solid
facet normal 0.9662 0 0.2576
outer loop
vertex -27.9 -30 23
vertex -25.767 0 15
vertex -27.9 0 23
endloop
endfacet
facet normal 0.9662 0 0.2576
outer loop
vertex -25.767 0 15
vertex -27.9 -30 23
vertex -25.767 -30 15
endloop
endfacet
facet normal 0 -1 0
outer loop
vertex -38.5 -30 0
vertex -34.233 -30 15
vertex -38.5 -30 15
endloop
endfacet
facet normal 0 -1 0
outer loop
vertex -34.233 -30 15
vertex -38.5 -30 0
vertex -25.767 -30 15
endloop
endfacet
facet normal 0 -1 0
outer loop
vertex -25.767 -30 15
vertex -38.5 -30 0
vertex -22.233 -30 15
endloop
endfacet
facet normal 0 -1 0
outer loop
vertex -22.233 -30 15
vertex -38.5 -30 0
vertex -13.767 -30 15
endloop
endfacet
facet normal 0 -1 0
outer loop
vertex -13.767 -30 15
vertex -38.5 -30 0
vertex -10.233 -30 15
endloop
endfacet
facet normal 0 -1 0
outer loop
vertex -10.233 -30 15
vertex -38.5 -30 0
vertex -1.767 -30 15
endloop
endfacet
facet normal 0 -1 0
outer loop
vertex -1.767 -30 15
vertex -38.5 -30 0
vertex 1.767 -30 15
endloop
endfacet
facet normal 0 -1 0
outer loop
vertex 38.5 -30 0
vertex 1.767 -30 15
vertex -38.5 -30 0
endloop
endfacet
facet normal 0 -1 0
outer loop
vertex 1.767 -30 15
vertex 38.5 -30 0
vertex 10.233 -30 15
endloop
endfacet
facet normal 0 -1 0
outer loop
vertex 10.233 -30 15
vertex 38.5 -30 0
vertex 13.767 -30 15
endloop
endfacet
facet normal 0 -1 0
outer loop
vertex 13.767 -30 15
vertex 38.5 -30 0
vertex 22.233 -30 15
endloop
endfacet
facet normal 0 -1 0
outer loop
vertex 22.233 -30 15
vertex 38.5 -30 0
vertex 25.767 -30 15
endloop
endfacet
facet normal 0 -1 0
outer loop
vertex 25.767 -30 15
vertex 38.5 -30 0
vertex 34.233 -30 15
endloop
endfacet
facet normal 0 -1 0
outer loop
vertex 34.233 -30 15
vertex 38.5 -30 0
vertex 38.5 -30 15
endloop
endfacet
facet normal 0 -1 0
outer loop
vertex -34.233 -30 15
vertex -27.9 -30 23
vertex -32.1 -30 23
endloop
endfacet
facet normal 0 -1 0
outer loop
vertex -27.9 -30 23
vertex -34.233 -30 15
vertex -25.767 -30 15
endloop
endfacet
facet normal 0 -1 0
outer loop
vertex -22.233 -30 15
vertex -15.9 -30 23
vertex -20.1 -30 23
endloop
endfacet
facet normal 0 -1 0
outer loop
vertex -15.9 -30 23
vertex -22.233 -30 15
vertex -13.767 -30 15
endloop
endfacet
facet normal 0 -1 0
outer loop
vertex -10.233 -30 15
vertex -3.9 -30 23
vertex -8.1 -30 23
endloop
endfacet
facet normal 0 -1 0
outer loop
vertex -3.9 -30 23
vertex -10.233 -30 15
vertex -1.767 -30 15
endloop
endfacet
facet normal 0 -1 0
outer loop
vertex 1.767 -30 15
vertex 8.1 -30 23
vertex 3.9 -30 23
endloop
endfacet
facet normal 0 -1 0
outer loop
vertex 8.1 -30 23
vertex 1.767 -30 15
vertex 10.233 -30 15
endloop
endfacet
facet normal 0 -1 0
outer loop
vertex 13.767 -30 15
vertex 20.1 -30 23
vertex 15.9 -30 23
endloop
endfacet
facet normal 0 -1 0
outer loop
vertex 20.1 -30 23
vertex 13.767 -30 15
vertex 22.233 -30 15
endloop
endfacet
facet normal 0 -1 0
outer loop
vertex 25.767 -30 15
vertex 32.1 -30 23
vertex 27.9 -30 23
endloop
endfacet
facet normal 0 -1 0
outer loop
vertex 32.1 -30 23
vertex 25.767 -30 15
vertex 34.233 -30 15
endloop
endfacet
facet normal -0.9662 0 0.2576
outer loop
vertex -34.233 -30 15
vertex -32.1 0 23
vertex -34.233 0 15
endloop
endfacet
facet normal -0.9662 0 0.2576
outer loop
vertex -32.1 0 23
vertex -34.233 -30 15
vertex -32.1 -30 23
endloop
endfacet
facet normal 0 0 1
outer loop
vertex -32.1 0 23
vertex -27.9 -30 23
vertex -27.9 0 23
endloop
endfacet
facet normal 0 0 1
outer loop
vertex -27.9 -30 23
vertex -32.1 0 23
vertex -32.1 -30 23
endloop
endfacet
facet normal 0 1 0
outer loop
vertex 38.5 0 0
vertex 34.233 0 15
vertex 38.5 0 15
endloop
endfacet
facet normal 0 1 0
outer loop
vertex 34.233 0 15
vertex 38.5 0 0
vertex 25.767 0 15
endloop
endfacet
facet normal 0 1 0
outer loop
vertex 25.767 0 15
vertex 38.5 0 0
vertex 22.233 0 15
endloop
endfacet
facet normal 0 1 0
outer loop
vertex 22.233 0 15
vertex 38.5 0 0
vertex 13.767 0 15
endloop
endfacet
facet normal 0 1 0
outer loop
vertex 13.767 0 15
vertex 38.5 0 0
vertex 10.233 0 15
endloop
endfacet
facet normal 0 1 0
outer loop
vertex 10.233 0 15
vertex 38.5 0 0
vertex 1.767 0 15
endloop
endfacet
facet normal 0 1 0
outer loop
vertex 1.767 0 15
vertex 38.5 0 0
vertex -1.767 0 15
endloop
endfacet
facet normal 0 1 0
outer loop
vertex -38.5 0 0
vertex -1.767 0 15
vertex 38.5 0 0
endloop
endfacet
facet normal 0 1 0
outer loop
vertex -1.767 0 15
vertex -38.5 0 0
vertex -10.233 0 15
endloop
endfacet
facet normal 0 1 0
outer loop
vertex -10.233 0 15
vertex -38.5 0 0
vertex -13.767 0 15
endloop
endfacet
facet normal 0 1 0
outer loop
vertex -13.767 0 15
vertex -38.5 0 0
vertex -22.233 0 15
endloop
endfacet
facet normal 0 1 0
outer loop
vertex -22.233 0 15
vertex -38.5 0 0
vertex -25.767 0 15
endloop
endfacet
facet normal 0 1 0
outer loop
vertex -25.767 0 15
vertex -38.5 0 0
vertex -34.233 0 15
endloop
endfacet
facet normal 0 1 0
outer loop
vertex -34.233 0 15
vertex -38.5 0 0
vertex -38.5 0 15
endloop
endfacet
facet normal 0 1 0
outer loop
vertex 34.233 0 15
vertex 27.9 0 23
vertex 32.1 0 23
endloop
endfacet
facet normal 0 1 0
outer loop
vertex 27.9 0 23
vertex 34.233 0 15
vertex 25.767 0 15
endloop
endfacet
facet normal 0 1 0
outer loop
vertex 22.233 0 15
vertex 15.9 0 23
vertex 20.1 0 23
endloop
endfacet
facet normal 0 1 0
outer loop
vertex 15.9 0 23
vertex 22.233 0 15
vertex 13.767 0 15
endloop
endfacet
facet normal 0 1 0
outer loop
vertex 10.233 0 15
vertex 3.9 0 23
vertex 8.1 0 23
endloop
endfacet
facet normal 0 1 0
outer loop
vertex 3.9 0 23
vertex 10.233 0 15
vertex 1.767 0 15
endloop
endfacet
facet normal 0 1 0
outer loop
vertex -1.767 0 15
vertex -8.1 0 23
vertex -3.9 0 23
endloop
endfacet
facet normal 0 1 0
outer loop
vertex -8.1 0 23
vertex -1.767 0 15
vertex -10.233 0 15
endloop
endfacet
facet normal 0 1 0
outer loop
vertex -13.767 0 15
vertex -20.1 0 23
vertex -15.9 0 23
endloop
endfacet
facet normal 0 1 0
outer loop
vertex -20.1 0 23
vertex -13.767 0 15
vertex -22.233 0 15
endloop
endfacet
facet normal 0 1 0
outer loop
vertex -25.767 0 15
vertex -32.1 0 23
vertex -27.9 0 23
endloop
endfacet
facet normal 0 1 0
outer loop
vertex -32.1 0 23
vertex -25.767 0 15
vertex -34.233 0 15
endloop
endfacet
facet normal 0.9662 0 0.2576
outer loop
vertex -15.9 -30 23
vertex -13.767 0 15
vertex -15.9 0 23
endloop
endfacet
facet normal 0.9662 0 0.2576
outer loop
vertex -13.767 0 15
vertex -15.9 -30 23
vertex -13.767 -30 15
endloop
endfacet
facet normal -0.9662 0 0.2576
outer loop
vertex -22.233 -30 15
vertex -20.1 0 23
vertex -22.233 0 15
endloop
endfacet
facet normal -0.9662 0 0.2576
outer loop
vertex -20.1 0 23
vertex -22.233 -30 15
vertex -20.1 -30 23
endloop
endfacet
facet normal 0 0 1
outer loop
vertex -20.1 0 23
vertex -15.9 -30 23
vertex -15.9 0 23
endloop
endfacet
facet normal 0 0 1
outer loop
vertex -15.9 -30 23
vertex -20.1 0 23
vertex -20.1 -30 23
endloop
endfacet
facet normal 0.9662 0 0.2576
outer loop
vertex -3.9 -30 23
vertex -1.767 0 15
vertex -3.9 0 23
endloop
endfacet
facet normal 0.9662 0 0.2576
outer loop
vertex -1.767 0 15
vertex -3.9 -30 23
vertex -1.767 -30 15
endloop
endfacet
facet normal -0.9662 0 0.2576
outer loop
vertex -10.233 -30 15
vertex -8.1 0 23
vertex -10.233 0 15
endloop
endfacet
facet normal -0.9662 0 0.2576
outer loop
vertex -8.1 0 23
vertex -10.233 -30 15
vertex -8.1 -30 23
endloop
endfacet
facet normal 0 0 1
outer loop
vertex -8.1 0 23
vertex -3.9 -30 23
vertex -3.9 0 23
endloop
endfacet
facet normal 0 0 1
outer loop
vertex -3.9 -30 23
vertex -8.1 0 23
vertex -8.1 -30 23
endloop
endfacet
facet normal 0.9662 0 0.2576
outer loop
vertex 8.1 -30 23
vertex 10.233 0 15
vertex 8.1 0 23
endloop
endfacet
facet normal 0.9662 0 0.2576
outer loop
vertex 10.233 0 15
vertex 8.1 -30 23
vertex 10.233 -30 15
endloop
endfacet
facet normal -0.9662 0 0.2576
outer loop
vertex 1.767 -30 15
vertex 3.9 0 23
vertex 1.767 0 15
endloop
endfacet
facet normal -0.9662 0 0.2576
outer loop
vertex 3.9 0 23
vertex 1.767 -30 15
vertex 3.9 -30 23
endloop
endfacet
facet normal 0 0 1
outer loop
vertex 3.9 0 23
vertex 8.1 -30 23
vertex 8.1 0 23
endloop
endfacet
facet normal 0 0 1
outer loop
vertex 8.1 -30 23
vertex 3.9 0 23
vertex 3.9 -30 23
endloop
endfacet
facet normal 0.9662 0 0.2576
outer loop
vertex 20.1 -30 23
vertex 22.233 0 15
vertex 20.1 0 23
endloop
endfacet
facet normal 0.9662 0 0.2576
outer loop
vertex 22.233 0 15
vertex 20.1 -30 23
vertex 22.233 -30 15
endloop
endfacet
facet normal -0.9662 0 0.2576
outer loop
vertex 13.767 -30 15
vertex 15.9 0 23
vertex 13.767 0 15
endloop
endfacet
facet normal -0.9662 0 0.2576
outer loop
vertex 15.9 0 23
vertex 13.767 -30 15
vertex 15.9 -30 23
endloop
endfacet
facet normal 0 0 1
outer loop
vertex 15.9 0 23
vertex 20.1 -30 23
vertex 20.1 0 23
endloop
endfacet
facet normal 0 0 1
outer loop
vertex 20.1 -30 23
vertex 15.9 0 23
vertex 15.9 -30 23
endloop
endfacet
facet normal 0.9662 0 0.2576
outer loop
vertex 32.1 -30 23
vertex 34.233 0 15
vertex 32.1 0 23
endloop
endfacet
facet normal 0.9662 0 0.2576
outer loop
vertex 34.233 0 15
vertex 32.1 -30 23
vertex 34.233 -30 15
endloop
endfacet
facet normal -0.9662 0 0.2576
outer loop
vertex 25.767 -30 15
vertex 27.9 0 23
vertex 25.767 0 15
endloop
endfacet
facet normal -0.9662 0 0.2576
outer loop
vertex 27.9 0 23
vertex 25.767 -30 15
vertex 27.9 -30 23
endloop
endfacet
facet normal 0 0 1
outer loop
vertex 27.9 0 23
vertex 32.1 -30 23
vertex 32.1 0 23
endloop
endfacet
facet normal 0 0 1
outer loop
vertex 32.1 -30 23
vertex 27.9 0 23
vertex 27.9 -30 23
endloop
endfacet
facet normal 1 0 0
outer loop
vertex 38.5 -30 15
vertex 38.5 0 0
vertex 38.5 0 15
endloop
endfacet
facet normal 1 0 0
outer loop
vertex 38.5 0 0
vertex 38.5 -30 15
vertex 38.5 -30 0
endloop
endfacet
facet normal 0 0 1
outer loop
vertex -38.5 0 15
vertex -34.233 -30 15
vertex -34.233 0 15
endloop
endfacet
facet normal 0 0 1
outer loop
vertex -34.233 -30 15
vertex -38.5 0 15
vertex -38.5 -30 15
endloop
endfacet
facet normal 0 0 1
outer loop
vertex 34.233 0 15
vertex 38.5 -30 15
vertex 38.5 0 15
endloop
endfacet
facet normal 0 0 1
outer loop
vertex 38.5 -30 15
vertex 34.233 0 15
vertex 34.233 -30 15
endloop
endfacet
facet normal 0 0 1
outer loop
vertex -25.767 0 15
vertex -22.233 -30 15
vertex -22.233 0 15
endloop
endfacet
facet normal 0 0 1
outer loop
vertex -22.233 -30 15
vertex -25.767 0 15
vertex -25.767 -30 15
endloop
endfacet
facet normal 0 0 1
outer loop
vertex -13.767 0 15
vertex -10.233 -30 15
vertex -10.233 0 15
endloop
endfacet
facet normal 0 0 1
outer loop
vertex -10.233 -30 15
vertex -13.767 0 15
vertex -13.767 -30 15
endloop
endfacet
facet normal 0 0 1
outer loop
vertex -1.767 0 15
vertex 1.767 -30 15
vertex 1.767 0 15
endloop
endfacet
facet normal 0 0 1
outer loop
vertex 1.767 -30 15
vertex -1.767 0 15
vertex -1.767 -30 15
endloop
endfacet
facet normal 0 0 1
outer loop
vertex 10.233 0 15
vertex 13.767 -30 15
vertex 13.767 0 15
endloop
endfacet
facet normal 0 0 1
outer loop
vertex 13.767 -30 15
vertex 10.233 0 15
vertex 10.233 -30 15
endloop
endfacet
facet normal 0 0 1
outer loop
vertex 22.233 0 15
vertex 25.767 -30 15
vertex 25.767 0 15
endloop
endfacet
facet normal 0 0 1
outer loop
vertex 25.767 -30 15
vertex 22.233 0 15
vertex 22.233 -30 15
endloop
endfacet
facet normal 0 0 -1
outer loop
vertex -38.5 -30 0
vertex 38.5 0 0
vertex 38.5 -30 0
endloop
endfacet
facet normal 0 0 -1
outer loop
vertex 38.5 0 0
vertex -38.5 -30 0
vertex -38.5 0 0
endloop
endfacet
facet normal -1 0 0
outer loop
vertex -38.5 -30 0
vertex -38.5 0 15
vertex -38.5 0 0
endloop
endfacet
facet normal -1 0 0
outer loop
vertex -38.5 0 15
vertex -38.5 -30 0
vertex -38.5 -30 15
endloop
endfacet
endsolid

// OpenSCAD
$fn = 32;

// ----------------------------------------------------------------------
// Toothed rack, 6 teeth
// 12 mm pitch, 8 mm teeth
// ----------------------------------------------------------------------

// --- parameters (mm) ---
bar_w = 30;     // bar width (Y)
bar_h = 15;     // bar height (Z)
teeth = 6;      // number of teeth
pitch = 12;     // tooth pitch
tooth_h = 8;    // tooth height above the bar
root_w = 9;     // tooth width at the root
crest_w = 4.2;  // tooth width at the crest

// --- derived feature positions (mm) ---
span = (teeth - 1) * pitch;  // = 60   distance between the outer teeth
bar_l = span + root_w + 8;   // = 77   bar length: teeth plus 4 mm at each end
tooth_x = -span / 2;         // = -30   X of the first tooth
height = bar_h + tooth_h;    // = 23   overall height
feature_centers = [
  [tooth_x + 0 * pitch, -bar_w / 2],
  [tooth_x + 1 * pitch, -bar_w / 2],
  [tooth_x + 2 * pitch, -bar_w / 2],
  [tooth_x + 3 * pitch, -bar_w / 2],
  [tooth_x + 4 * pitch, -bar_w / 2],
  [tooth_x + 5 * pitch, -bar_w / 2]
];   // tooth centre line, drives the tooth loop

// bar with a rack of teeth, one extruded trapezoium per centre
module rack_tooth() {
  linear_extrude(height = bar_w)
    polygon(points = [
      [0, 0],
      [root_w, 0],
      [root_w / 2 + crest_w / 2, tooth_h + 1],
      [root_w / 2 - crest_w / 2, tooth_h + 1]
    ]);
}

union() {
  translate([-bar_l / 2, -bar_w, 0]) cube([bar_l, bar_w, bar_h]);
  for (centre = feature_centers)
    translate([centre[0] - root_w / 2, 0, bar_h - 1]) rotate([90, 0, 0]) rack_tooth();
}
